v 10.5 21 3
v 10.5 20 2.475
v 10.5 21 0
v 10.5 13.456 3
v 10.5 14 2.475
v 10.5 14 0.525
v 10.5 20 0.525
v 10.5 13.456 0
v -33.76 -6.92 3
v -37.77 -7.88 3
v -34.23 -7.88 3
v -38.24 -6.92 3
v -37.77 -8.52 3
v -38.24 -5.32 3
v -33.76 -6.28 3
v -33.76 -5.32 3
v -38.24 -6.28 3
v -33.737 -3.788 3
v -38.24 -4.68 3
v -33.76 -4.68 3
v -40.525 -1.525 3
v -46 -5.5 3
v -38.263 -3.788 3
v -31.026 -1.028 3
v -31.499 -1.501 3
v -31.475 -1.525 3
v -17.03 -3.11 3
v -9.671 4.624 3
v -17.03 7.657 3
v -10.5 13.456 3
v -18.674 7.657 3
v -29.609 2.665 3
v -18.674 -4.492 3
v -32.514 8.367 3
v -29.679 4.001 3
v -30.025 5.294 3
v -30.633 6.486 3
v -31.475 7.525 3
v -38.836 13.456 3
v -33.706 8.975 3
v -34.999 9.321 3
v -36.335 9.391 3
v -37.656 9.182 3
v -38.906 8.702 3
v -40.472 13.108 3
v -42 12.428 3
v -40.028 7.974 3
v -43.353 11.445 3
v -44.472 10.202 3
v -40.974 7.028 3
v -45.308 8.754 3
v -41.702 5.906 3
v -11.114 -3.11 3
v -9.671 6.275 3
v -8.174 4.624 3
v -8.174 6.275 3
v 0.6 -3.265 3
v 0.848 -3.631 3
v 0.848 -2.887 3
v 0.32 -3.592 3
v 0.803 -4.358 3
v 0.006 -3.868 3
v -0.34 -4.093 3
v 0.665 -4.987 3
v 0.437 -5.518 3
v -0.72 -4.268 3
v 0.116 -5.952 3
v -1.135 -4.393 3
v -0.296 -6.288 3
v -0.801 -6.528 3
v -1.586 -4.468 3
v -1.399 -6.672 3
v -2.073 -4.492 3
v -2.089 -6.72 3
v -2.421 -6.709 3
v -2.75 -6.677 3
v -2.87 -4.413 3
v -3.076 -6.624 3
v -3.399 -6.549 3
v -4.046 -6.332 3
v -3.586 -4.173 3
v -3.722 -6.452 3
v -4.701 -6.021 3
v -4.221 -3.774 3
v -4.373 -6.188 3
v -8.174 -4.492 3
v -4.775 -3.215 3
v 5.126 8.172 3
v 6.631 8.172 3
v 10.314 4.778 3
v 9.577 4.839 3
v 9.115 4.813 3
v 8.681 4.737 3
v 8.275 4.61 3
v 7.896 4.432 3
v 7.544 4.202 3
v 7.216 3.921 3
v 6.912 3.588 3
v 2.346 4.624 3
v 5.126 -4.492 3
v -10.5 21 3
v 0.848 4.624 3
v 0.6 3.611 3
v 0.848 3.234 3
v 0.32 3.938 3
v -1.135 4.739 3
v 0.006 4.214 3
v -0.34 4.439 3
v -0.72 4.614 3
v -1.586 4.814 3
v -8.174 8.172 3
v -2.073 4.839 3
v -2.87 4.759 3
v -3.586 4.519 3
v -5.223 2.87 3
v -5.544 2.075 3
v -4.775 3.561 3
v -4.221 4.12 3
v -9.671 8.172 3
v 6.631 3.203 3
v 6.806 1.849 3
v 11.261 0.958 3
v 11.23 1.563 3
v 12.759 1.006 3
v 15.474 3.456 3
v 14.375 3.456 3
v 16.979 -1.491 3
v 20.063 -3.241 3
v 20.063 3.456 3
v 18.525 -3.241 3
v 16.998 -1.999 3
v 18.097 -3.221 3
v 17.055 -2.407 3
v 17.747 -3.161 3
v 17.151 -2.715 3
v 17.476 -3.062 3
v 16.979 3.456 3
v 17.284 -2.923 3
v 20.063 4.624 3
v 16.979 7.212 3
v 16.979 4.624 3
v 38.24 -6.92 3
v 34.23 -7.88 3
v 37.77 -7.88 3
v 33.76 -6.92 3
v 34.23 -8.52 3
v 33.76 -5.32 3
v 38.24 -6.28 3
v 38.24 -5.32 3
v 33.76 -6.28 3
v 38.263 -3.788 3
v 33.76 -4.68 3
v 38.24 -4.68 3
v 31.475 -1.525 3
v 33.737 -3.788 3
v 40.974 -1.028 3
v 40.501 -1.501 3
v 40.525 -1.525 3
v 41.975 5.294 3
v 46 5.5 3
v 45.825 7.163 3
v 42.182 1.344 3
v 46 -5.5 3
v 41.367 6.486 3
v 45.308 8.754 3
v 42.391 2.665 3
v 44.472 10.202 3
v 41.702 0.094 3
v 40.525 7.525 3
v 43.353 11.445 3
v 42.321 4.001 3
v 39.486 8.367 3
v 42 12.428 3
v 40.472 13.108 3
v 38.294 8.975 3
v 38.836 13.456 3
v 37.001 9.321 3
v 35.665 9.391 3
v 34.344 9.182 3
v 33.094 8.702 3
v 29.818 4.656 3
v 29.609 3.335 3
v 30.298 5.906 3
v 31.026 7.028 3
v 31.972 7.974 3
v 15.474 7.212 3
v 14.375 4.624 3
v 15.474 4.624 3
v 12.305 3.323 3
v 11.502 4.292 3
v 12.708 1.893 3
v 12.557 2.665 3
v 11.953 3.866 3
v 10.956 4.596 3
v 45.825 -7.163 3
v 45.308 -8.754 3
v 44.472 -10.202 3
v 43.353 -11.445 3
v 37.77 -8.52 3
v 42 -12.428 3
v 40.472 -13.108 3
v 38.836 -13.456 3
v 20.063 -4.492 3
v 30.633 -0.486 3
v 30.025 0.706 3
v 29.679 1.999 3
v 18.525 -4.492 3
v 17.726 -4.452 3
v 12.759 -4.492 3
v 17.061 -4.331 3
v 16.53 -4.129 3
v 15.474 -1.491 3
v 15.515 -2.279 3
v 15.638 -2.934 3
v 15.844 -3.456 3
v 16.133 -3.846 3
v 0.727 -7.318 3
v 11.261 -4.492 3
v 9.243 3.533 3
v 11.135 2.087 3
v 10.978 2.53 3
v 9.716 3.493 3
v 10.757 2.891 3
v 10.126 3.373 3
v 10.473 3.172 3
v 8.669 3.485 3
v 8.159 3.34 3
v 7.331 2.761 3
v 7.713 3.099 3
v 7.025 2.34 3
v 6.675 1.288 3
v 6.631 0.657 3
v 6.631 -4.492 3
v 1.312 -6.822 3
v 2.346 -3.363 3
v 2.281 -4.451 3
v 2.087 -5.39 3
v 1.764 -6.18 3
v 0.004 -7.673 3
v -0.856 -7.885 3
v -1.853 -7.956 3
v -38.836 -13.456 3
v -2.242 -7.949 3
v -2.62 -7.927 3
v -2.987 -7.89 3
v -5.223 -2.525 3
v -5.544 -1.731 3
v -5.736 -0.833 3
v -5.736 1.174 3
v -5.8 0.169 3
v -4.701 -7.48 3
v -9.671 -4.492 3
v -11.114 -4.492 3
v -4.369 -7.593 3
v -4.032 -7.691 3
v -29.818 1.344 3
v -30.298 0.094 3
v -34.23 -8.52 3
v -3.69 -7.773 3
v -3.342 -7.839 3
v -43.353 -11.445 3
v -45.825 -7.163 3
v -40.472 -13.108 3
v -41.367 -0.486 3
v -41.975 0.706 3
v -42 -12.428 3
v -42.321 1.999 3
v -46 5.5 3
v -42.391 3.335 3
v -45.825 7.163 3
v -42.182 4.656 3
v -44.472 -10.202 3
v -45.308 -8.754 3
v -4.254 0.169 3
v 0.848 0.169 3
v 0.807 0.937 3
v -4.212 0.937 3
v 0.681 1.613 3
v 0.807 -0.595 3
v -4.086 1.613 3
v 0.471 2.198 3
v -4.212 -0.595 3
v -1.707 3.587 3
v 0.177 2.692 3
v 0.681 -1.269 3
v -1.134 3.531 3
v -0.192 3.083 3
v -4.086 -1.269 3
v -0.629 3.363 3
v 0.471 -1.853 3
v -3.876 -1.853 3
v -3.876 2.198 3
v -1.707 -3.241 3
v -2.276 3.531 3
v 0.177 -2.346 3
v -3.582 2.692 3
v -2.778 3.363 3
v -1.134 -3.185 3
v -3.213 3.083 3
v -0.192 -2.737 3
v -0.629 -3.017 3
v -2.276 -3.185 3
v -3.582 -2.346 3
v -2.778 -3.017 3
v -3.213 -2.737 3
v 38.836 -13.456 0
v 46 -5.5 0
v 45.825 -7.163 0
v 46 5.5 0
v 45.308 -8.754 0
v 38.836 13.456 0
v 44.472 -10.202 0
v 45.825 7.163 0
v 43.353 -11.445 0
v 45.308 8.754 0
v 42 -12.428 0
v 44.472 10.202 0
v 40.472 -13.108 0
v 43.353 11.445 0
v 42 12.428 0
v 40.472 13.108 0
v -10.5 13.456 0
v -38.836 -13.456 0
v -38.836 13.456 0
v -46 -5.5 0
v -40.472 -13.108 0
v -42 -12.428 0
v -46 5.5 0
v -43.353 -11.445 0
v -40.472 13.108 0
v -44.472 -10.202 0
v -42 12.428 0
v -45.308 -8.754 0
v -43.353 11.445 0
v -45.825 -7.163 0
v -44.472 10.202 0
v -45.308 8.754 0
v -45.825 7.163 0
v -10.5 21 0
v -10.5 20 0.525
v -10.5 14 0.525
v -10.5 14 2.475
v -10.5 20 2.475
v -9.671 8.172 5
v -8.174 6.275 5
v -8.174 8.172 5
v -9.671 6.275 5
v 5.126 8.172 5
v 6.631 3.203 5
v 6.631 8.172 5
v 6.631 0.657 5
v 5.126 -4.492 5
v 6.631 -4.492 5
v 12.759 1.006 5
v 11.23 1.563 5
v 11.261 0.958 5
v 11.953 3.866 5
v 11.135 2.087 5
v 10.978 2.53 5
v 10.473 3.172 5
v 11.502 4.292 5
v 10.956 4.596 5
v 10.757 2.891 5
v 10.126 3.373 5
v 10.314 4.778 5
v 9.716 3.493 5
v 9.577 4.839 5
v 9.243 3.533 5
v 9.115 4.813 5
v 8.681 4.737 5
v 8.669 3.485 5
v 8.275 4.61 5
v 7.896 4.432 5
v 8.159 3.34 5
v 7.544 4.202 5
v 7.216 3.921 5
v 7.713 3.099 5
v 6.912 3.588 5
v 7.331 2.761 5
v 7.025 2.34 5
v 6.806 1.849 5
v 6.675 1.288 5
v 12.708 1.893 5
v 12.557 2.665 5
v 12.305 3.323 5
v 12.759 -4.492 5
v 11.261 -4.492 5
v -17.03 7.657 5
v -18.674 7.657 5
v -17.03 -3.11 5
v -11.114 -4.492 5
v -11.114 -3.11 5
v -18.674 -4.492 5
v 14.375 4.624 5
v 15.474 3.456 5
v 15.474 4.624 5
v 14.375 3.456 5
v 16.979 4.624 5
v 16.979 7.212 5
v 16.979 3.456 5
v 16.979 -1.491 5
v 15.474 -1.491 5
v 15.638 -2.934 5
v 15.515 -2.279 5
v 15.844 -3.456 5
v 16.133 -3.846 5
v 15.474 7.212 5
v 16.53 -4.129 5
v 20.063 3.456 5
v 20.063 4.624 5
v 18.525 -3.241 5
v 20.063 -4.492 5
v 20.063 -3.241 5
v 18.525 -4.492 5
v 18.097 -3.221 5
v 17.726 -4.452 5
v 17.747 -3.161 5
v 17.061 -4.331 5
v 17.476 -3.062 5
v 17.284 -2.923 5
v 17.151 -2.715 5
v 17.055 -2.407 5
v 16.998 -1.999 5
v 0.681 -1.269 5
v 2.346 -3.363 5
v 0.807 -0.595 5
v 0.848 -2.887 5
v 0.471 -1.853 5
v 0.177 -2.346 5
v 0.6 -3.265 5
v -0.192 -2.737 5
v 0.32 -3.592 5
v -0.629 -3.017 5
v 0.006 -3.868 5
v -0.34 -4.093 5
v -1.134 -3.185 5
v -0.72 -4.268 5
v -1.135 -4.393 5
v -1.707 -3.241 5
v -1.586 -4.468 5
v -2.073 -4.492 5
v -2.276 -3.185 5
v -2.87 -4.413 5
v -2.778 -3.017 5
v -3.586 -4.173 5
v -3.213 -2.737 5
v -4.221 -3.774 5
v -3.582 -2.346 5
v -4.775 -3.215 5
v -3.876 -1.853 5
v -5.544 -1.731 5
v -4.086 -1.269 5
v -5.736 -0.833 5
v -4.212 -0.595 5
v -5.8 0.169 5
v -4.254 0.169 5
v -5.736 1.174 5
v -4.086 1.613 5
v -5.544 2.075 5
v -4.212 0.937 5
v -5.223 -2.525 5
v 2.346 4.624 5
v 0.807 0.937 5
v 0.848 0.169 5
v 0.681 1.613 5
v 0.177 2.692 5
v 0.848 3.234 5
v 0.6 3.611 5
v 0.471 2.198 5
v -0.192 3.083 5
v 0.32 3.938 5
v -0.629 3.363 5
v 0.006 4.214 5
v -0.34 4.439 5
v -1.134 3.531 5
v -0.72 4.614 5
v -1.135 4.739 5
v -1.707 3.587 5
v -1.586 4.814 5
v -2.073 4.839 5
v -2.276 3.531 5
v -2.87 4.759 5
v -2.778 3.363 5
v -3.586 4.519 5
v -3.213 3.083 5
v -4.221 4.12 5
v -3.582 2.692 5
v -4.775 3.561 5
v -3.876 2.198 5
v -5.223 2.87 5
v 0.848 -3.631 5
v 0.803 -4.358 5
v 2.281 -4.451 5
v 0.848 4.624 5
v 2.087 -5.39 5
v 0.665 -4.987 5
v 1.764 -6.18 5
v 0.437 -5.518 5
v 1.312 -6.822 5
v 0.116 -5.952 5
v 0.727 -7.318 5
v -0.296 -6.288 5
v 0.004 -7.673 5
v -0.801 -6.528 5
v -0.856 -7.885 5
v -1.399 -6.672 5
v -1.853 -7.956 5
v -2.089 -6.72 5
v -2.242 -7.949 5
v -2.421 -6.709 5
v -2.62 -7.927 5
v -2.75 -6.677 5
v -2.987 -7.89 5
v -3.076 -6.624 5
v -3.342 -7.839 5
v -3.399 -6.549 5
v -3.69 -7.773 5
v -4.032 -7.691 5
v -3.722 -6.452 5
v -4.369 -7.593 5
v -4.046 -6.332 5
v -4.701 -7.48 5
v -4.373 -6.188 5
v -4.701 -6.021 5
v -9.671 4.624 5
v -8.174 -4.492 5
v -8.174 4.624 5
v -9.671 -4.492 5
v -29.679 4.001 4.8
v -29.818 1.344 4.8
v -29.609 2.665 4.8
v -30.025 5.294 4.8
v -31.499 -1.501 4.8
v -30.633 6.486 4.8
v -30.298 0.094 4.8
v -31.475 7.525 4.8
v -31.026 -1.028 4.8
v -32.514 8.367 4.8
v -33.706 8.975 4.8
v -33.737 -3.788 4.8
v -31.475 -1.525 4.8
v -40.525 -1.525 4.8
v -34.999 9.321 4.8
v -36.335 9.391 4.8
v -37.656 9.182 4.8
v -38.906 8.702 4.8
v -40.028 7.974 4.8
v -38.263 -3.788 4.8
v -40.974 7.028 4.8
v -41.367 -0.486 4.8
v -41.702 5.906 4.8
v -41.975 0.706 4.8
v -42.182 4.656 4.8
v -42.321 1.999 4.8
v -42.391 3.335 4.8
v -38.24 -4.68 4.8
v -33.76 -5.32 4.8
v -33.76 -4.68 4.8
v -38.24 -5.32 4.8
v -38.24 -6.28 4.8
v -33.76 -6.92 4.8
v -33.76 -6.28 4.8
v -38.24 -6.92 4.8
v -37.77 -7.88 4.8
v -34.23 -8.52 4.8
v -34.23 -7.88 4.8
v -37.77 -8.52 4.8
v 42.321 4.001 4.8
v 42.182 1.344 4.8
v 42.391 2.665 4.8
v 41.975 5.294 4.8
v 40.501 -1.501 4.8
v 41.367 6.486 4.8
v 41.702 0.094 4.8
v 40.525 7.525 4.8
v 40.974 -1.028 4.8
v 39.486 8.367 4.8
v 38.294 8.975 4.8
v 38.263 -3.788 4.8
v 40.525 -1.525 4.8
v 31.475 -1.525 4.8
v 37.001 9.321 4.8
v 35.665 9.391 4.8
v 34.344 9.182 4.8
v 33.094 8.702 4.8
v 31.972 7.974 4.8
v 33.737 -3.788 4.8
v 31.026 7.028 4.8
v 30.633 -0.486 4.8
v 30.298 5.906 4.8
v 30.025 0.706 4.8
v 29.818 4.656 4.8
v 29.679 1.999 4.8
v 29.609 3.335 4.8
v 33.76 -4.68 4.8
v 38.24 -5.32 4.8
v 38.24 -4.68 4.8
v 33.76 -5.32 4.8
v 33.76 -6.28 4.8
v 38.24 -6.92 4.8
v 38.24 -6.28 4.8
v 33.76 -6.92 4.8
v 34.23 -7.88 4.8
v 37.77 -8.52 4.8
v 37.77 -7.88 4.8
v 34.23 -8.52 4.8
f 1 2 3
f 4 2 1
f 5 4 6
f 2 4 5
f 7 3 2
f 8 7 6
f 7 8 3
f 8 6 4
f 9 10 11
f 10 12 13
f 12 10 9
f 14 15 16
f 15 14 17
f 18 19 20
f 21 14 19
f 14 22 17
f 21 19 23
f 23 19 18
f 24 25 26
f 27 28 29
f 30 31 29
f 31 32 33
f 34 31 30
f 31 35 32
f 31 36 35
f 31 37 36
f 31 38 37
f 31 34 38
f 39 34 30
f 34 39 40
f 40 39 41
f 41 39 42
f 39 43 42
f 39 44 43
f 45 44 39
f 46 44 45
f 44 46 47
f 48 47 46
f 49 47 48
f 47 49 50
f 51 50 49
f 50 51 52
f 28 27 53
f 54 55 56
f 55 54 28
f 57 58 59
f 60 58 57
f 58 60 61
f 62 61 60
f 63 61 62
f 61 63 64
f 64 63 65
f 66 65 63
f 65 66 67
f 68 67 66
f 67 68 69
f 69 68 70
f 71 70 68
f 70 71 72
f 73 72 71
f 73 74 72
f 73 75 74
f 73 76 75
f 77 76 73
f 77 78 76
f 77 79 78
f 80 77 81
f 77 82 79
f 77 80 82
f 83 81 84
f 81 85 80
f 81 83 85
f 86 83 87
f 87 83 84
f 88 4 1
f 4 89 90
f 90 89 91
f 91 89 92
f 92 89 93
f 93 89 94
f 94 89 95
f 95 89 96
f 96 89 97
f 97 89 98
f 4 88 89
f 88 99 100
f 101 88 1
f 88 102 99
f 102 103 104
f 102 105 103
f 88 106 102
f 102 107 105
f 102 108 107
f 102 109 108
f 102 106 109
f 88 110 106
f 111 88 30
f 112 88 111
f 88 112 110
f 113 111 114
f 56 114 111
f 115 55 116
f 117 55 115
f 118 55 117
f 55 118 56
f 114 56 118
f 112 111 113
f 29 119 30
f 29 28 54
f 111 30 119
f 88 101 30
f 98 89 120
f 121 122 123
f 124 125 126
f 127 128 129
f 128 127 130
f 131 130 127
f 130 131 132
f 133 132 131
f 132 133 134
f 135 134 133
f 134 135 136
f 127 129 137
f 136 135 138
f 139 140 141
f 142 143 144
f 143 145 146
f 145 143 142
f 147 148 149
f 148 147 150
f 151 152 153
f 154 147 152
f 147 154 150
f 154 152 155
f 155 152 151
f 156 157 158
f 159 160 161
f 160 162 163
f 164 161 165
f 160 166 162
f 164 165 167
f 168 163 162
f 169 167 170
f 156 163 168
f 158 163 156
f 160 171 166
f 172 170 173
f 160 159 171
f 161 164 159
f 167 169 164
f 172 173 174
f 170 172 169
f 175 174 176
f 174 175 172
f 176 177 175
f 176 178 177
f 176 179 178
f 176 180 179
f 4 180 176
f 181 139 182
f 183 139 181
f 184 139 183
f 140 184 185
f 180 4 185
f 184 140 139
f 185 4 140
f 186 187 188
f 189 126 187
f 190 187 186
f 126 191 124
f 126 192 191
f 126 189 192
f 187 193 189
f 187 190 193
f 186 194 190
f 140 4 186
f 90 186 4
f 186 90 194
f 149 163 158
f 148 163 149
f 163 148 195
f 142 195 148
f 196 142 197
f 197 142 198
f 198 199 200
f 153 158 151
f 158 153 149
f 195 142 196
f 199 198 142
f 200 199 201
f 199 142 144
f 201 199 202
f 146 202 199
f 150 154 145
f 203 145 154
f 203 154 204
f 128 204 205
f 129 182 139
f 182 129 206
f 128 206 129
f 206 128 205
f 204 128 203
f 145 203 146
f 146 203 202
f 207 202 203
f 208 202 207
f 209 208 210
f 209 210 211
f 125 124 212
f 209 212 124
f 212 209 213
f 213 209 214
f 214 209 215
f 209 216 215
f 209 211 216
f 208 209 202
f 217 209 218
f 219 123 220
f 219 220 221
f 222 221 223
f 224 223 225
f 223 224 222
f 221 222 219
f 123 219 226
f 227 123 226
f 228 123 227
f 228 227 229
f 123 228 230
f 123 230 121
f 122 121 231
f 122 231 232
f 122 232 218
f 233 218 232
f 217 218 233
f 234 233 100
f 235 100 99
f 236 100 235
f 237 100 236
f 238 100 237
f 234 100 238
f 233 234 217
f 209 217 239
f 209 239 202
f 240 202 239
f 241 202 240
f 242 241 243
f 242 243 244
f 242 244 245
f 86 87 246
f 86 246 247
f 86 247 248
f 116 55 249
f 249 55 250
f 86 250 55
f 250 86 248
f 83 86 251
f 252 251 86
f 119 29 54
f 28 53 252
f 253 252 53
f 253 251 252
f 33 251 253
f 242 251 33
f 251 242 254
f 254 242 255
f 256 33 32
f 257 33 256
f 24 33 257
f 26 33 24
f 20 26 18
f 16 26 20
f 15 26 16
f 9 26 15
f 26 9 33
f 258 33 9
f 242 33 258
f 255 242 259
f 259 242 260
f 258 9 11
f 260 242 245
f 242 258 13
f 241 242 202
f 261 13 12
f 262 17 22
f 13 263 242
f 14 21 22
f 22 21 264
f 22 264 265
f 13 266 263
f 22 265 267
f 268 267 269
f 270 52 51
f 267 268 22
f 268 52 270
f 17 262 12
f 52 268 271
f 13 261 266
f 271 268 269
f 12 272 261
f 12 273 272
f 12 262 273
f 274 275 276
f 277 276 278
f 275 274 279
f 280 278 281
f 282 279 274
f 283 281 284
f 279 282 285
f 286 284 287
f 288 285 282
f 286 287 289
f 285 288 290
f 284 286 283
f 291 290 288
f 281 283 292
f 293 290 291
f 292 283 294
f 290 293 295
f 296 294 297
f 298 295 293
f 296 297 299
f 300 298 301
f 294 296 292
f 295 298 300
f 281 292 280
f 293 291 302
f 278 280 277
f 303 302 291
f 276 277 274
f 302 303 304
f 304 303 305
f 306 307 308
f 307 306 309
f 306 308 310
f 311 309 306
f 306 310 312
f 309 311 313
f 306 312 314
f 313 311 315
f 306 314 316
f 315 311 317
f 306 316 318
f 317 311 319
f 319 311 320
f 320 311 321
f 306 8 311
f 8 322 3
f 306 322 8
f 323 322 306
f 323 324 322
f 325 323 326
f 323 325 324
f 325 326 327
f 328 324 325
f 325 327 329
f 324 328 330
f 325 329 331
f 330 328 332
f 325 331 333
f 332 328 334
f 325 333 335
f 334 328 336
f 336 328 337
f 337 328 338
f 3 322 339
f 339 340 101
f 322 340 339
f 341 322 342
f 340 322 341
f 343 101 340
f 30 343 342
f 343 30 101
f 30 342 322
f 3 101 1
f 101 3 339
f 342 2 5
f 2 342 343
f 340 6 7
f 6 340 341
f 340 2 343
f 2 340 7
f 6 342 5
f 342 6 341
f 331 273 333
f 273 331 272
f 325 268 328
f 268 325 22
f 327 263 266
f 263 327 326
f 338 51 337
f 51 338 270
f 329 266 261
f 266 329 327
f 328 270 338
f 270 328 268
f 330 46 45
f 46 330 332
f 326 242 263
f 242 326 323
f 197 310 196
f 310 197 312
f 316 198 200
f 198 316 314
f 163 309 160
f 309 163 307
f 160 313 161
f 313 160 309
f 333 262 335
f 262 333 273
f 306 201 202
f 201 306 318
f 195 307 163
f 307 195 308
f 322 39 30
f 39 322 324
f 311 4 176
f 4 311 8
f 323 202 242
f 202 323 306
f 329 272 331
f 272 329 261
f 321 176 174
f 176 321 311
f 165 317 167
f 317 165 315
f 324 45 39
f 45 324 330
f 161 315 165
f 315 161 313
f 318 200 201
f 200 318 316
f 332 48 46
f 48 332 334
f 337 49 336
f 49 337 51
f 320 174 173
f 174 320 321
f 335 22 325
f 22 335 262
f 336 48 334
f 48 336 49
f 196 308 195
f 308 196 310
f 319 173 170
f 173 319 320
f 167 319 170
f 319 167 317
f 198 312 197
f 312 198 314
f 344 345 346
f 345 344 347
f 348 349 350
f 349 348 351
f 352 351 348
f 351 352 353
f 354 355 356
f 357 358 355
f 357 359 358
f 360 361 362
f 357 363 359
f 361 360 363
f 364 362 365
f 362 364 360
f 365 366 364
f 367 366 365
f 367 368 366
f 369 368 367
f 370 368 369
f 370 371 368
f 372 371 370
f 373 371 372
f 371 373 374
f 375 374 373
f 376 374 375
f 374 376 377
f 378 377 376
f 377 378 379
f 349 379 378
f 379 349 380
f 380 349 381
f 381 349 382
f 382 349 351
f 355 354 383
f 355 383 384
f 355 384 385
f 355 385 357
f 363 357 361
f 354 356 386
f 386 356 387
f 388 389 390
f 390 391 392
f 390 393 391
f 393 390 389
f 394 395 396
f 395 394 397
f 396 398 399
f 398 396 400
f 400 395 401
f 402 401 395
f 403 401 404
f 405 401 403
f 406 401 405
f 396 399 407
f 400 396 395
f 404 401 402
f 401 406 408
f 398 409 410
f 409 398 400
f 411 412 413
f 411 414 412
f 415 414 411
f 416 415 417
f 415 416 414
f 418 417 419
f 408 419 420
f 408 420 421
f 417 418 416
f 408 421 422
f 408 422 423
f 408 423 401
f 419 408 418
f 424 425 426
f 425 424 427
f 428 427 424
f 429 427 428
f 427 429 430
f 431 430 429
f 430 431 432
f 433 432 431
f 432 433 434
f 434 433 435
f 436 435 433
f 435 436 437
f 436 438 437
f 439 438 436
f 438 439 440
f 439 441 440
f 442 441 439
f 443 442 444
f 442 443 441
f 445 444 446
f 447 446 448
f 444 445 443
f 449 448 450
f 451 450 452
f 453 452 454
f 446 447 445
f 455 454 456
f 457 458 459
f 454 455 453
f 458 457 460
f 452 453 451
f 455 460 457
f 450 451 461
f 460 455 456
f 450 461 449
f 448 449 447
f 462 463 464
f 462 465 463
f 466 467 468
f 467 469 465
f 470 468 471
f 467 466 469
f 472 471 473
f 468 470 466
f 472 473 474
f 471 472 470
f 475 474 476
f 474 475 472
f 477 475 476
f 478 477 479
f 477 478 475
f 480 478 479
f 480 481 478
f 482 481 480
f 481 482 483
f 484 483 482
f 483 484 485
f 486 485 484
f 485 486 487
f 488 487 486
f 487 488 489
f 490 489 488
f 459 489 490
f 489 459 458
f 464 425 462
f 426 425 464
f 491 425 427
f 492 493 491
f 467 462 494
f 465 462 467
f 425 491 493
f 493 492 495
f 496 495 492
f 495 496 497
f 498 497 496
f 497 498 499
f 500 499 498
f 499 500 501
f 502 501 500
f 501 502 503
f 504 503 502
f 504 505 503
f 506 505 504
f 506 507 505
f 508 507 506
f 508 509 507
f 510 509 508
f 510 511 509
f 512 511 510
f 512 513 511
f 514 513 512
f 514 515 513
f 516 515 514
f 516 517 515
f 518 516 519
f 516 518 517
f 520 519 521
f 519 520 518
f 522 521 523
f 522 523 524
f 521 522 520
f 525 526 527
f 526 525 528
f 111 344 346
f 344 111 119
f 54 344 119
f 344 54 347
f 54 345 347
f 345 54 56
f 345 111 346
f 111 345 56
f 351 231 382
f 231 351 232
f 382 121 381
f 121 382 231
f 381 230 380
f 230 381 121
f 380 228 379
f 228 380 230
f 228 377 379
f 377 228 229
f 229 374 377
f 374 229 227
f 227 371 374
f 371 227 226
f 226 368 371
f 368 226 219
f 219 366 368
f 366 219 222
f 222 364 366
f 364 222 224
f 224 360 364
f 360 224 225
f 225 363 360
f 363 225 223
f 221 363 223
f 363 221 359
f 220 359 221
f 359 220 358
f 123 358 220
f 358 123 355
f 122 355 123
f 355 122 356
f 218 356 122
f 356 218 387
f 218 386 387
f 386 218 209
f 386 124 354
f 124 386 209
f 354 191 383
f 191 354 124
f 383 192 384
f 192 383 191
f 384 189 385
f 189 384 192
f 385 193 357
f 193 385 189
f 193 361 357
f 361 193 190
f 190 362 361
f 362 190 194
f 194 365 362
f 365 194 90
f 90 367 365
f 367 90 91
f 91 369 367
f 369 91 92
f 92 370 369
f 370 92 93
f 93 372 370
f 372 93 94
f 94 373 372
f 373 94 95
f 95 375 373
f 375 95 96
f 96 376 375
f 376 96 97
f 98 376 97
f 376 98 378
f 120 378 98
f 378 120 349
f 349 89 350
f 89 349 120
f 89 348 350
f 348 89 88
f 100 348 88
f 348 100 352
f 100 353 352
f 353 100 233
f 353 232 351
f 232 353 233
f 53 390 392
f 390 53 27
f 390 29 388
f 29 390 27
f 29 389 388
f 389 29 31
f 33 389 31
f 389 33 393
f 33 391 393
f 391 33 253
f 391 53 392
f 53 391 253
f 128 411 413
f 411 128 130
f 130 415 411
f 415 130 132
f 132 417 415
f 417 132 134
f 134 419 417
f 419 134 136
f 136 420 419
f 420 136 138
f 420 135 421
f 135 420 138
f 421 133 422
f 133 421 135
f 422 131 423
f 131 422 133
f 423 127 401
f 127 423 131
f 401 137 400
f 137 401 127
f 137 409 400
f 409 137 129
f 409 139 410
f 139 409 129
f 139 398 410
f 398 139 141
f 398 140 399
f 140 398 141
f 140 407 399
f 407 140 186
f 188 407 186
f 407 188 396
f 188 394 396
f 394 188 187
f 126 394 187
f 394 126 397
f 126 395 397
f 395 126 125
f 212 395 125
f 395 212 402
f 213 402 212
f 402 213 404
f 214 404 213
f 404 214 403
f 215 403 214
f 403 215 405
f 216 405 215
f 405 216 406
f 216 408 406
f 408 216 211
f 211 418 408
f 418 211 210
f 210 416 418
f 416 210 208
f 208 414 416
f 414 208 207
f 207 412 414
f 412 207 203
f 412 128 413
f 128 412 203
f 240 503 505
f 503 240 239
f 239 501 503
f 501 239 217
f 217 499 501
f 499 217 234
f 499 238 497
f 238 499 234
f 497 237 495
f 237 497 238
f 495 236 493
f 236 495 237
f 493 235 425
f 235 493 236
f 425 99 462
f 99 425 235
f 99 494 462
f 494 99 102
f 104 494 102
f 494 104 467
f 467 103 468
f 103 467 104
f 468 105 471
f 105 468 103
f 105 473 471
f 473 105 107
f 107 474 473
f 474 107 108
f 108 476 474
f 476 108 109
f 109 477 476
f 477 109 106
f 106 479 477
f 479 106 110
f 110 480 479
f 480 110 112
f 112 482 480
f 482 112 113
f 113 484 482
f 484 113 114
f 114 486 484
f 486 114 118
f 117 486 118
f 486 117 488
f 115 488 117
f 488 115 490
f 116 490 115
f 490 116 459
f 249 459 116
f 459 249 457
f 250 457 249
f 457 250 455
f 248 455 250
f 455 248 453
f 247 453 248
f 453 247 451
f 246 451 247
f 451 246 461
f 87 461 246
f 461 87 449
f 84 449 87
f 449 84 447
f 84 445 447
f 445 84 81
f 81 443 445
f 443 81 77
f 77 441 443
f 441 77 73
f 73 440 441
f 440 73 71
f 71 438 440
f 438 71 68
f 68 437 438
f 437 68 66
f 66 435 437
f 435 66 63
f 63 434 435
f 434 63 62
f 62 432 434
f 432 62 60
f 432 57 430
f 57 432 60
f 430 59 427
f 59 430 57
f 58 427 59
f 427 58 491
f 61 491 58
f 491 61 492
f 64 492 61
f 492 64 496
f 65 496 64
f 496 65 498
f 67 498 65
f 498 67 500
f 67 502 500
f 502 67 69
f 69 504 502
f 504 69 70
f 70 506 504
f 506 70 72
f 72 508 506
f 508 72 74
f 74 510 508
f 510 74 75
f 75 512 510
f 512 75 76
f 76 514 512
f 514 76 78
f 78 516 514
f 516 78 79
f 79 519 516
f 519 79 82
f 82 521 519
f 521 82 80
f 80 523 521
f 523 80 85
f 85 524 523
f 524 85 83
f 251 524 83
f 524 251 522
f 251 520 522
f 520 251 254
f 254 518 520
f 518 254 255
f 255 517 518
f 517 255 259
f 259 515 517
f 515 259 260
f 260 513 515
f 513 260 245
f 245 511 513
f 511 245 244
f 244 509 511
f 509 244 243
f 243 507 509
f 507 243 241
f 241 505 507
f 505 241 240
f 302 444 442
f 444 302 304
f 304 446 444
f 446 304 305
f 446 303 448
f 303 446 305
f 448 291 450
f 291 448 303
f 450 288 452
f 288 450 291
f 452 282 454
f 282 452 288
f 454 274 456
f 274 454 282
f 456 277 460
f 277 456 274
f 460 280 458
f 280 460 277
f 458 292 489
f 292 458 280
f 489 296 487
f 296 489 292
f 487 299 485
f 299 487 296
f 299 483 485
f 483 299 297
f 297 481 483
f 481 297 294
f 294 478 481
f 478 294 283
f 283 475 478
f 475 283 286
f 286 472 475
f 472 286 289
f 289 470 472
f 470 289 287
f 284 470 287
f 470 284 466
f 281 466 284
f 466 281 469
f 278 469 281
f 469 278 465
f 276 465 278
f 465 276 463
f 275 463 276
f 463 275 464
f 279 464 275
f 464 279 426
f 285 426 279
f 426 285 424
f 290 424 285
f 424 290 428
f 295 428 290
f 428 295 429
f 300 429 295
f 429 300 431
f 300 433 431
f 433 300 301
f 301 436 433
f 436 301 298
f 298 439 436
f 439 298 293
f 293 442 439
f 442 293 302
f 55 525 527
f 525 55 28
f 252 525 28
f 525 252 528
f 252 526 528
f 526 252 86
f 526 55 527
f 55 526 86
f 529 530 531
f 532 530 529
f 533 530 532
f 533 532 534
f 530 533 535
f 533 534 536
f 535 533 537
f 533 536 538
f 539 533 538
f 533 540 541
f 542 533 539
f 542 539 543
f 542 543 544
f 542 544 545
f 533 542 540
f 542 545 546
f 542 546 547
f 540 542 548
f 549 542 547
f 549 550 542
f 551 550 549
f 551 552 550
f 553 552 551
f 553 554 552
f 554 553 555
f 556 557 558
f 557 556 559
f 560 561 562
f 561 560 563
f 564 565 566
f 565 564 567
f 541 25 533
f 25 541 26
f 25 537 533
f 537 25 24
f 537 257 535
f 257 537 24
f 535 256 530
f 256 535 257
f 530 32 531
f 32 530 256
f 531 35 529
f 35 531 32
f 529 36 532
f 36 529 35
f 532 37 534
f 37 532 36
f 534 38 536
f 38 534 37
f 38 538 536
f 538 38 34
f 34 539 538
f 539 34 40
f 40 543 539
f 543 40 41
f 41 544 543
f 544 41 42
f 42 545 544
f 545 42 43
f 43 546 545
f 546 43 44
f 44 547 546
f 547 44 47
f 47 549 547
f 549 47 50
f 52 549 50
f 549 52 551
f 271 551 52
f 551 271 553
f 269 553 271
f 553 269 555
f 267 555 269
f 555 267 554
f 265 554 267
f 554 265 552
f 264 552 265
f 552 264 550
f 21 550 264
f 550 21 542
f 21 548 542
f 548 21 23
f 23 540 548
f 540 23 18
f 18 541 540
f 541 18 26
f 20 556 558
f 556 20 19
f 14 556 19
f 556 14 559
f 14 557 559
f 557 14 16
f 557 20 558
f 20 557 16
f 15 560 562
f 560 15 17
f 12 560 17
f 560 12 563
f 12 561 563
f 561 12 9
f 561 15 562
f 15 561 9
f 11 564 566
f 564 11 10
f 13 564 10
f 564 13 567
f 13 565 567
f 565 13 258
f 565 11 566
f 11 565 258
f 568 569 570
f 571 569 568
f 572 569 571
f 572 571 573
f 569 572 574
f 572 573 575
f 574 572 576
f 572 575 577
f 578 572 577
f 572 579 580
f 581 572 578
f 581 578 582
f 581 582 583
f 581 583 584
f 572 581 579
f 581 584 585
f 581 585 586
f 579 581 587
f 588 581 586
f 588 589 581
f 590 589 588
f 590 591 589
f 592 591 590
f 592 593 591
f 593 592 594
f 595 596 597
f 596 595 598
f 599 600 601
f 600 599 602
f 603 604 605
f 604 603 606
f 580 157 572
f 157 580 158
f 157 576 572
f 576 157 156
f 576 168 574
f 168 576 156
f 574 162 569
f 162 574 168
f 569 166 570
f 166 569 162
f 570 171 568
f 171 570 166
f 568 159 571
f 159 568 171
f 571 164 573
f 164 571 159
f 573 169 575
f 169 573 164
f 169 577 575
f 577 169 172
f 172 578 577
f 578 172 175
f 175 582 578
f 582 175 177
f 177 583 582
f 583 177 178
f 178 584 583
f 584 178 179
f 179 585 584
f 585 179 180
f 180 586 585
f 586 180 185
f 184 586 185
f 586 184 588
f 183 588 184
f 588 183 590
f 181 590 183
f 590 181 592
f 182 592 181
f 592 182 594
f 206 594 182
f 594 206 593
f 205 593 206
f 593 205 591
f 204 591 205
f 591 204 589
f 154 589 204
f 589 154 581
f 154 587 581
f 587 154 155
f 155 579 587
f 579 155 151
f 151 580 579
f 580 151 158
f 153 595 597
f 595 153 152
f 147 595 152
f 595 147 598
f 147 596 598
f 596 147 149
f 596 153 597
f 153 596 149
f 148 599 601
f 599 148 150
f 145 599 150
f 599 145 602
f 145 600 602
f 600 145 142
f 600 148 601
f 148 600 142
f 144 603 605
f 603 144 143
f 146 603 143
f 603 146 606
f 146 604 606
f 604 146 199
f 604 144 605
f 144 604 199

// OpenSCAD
use <../../../name-tag.scad>

iconType = "Light Bulb";
iconXyScale = 0.8;
iconHeight = 3;
        
nametag(topText="Light",
        topTextSize = 12,
        font="../../../write/orbitron.dxf",
        
        leftIconType = iconType,
        leftIconHeight = iconHeight,
        leftIconXyScale = iconXyScale,
        rightIconType = iconType,
        rightIconHeight = iconHeight,
        rightIconXyScale = iconXyScale,
        xIconOffset = 36,
        yIconOffset = 3,
        
        baseWidth = 80,
        
        chainLoop = true,
        chainLoopPosition = "top");
